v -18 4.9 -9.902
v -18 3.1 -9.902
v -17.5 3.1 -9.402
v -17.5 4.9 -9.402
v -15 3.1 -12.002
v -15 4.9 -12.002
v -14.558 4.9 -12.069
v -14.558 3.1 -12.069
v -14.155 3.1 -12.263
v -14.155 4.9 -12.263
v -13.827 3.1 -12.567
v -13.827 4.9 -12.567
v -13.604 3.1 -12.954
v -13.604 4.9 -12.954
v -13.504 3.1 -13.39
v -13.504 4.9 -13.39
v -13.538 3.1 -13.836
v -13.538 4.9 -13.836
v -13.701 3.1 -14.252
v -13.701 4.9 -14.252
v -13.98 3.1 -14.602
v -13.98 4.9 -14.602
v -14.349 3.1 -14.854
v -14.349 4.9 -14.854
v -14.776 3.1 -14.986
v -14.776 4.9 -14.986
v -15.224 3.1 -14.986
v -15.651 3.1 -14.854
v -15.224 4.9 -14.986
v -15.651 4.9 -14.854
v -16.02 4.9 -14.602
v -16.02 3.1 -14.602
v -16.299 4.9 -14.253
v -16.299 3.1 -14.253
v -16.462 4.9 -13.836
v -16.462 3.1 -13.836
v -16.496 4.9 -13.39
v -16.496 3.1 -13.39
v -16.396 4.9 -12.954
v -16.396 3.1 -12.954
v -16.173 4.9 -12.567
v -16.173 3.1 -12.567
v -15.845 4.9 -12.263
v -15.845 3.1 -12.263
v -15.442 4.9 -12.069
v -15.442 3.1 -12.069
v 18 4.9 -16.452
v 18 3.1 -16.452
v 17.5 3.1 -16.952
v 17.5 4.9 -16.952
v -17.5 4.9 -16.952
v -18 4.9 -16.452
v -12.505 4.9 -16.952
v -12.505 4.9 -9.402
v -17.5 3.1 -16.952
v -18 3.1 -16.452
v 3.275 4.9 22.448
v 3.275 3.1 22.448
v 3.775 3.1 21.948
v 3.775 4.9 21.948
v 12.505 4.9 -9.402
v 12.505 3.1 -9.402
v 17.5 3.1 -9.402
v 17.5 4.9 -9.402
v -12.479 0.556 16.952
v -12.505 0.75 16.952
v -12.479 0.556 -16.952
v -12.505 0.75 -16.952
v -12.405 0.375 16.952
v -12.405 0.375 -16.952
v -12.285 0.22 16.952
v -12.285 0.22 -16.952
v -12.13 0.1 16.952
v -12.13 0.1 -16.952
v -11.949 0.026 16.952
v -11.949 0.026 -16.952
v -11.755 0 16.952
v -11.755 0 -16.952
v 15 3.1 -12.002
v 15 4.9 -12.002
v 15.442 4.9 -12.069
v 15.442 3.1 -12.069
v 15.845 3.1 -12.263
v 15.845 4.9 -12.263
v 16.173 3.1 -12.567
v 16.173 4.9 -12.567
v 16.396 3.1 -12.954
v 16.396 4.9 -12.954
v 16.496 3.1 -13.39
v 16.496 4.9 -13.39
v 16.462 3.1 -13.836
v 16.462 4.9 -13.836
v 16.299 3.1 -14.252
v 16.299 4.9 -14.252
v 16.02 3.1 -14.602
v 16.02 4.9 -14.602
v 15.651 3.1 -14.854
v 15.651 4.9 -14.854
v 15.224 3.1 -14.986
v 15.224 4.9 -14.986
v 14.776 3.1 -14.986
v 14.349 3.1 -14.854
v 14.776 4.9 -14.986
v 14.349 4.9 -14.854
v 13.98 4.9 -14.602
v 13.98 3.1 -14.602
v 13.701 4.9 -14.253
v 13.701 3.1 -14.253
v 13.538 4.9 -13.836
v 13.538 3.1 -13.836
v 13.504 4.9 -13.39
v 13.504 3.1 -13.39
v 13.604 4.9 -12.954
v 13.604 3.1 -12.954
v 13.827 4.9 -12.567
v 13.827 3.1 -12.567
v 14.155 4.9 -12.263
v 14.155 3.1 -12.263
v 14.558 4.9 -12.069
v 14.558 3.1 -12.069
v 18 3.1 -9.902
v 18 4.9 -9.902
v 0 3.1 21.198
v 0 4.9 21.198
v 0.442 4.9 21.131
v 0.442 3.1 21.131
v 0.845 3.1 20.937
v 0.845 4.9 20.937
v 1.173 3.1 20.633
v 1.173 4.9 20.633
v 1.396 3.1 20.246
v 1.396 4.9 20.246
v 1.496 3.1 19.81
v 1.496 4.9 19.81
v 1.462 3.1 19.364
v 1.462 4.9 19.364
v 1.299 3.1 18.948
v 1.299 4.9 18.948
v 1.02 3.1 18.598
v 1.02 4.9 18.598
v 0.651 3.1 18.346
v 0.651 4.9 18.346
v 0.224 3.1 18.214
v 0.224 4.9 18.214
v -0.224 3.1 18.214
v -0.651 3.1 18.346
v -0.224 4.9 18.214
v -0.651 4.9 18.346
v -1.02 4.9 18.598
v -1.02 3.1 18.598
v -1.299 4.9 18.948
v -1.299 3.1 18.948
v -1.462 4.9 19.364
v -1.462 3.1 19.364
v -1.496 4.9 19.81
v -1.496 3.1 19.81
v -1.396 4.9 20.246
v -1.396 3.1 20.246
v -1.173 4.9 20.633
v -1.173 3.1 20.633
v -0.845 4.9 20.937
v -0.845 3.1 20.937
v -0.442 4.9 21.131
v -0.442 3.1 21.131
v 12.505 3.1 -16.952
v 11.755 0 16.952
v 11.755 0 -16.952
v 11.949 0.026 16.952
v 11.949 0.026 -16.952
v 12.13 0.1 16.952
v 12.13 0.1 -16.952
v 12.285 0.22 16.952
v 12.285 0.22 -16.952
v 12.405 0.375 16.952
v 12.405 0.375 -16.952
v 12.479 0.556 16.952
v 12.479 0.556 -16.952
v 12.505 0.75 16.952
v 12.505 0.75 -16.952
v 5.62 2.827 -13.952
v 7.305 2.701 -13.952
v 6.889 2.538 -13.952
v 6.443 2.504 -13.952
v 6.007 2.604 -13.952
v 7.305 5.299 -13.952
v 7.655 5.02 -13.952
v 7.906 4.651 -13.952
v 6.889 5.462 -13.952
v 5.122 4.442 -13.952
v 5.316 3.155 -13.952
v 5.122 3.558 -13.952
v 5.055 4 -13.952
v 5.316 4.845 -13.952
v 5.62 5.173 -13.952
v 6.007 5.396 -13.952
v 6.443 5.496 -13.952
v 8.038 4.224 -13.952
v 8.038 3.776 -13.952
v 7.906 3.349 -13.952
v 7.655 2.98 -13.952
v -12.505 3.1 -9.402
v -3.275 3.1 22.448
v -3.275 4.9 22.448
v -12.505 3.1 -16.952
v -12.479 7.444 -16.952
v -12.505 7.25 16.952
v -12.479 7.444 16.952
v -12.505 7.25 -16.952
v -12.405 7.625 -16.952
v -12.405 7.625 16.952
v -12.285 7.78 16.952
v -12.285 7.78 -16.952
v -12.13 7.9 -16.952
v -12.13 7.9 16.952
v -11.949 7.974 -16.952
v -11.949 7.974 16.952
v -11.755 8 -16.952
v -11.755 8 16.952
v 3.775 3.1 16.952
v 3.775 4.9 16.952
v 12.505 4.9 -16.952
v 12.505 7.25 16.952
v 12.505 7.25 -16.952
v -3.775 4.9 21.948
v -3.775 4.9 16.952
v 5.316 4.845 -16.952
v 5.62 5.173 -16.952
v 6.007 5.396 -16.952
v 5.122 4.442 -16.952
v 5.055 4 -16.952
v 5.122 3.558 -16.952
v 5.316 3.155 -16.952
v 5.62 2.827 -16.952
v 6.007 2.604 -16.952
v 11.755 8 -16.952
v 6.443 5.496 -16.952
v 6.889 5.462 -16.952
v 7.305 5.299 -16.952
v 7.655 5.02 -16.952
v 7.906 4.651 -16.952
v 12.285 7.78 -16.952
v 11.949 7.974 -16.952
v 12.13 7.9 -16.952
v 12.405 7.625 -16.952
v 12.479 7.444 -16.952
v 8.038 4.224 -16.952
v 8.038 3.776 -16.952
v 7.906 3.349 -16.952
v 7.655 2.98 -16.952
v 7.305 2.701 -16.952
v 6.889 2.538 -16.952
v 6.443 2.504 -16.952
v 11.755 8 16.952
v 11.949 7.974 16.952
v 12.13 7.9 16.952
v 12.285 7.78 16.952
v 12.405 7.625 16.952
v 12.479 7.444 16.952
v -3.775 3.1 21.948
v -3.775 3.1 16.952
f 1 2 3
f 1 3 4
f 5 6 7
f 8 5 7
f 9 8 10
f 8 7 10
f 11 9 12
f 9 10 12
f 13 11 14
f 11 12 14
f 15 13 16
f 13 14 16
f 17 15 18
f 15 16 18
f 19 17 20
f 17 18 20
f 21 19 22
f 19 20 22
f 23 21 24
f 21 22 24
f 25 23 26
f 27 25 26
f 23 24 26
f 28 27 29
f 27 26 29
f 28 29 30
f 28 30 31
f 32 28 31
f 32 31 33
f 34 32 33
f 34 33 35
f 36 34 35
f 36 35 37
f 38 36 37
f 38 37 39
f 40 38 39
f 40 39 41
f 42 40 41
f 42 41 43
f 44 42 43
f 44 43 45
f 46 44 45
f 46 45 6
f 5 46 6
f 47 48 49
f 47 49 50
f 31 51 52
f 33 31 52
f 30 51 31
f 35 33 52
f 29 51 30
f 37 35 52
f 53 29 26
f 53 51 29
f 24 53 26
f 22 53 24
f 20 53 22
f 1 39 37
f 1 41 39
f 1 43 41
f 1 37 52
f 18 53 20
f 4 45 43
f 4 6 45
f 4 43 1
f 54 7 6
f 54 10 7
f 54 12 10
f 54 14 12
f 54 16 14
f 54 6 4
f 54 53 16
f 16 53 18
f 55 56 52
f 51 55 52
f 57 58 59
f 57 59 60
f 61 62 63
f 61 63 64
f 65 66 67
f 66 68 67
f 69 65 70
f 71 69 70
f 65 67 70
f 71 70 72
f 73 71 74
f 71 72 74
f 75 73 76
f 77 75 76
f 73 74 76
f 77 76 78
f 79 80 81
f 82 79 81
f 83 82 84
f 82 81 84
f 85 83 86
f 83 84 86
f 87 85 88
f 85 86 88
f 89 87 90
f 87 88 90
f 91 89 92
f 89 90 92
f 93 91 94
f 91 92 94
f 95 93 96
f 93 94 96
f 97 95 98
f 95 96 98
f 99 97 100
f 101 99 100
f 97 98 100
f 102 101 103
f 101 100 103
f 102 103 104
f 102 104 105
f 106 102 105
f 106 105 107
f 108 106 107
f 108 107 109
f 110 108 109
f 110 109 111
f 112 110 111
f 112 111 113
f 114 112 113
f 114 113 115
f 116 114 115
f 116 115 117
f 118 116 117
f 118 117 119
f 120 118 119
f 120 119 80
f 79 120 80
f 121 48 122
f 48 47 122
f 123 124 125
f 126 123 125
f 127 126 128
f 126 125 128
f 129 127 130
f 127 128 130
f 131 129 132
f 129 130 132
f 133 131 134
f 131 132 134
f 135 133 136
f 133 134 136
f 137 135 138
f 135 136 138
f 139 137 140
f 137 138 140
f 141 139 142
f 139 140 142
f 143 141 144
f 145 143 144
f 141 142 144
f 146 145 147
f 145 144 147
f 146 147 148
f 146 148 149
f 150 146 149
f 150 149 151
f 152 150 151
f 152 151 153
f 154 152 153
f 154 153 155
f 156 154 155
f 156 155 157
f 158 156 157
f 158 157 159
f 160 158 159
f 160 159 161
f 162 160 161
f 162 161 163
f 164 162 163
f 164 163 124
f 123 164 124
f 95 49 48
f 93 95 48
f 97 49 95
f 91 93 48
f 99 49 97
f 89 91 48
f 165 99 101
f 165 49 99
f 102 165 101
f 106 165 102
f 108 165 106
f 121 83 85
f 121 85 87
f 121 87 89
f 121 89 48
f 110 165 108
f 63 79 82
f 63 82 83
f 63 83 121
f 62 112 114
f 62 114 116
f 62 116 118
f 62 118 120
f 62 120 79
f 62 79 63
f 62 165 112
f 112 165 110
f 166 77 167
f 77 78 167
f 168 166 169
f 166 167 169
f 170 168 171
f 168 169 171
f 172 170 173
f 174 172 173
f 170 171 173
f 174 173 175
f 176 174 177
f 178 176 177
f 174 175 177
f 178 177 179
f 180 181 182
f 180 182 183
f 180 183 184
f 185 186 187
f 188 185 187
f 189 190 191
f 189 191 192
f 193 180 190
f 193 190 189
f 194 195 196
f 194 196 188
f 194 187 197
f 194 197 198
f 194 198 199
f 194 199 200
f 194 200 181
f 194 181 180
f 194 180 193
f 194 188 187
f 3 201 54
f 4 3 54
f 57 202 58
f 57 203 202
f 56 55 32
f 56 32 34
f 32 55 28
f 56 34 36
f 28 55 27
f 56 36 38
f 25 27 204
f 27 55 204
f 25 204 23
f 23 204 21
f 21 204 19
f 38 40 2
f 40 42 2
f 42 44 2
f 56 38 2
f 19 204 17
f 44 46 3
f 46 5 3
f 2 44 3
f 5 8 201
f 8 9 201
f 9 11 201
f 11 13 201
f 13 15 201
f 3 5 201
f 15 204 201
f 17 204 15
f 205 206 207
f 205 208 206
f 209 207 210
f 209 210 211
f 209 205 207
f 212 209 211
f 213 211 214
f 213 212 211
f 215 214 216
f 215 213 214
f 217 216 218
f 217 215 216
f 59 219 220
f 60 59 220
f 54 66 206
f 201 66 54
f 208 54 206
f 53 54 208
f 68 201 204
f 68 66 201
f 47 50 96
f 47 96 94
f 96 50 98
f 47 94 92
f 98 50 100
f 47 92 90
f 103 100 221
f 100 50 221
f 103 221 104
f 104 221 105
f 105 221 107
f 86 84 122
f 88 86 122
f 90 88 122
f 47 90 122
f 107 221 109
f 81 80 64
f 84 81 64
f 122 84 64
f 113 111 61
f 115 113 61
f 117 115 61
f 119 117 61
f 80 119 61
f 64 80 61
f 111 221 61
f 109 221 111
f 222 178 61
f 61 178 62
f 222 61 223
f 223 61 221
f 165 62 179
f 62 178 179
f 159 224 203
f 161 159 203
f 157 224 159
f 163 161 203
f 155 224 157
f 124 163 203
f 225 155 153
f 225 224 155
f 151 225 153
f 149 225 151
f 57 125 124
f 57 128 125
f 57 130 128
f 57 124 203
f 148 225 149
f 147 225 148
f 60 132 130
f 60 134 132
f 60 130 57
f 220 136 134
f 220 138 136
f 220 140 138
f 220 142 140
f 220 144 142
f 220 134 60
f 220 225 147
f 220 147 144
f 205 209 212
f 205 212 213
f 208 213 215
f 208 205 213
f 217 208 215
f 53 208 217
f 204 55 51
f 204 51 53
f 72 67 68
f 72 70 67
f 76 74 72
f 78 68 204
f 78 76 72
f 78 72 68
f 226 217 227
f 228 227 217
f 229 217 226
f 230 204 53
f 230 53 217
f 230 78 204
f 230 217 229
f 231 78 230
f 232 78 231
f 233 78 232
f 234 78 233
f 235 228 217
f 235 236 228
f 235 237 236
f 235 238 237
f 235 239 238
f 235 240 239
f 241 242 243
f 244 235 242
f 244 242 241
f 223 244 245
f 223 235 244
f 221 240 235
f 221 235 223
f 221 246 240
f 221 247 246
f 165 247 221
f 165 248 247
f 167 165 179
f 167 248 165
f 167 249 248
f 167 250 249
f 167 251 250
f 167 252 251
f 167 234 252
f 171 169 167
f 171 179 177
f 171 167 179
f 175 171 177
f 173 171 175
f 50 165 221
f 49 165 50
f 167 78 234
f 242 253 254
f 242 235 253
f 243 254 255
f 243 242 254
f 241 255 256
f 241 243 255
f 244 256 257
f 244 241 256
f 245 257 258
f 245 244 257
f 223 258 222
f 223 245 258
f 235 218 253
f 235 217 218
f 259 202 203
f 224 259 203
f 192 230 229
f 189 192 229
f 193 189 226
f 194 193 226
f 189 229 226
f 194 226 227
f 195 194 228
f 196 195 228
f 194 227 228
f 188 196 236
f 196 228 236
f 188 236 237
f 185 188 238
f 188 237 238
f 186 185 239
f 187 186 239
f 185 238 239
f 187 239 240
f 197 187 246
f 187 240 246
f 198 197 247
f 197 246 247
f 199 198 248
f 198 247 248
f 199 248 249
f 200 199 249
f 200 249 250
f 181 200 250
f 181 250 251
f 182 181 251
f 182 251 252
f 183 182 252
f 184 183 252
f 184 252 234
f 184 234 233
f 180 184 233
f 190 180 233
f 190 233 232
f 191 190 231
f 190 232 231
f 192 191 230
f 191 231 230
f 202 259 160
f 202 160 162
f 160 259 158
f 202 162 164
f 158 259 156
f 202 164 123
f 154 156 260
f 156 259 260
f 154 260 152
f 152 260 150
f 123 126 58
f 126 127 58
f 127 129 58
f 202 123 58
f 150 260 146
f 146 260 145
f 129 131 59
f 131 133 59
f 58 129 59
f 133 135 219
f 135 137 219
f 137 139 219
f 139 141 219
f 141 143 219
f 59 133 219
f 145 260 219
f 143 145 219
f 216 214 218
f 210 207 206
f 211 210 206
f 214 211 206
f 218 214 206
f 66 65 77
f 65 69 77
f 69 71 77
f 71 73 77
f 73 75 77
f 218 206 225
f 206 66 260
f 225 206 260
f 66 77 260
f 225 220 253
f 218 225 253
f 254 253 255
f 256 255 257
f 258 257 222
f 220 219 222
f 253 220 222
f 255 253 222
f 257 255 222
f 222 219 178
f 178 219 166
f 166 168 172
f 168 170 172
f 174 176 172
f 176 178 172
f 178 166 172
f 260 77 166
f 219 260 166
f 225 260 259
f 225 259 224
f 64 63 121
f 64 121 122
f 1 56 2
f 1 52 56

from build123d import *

# Parameters (mm, degrees)
SKETCH1_W           = 25.01
SKETCH1_H           = 33.905
BOSS_EXTRUDE1_DEPTH = 8
SKETCH2_W           = 7.55
SKETCH2_H           = 1.8
BOSS_EXTRUDE2_DEPTH = 5.495
SKETCH3_W           = 7.55
SKETCH3_H           = 1.8
BOSS_EXTRUDE3_DEPTH = 5.495
SKETCH6_R           = 1.5
CUT_EXTRUDE1_DEPTH  = 2
SKETCH8_R           = 1.5
CUT_EXTRUDE2_DEPTH  = 3
FILLET1_R           = 0.75
CHAMFER1_SIZE       = 0.5


with BuildPart() as part:
    # Sketch1 → Boss-Extrude1 (new body)
    with BuildSketch(Plane(origin=(0, 0, 0), x_dir=(1, 0, 0), z_dir=(0, 1, 0))):
        Rectangle(SKETCH1_W, SKETCH1_H)
    extrude(amount=BOSS_EXTRUDE1_DEPTH)

    # Sketch2 → Boss-Extrude2 (add)
    with BuildSketch(Plane.XY.offset(16.9525)):
        with Locations((0, 4)):
            Rectangle(SKETCH2_W, SKETCH2_H)
    extrude(amount=BOSS_EXTRUDE2_DEPTH)

    # Sketch3 → Boss-Extrude3 (add)
    with BuildSketch(Plane.ZY.offset(12.505)):
        with Locations((-13.1775, 4)):
            Rectangle(SKETCH3_W, SKETCH3_H)
    boss_extrude3 = extrude(amount=BOSS_EXTRUDE3_DEPTH)

    # Mirror2: Boss-Extrude3 across plane
    add(boss_extrude3.mirror(Plane(origin=(0, 0, 0), x_dir=(0, 0, 1), z_dir=(1, 0, 0))))

    # Sketch6 → Cut-Extrude1 (cut)
    with BuildSketch(Plane(origin=(0, 4.9, 0), x_dir=(1, 0, 0), z_dir=(0, 1, 0))):
        with Locations(Location((-15, 13.5025, 0), (0, 0, 270))):
            Circle(SKETCH6_R)
        with Locations(Location((15, 13.5025, 0), (0, 0, 270))):
            Circle(SKETCH6_R)
        with Locations(Location((0, -19.6975, 0), (0, 0, 270))):
            Circle(SKETCH6_R)
    extrude(amount=-CUT_EXTRUDE1_DEPTH, mode=Mode.SUBTRACT)

    # Sketch8 → Cut-Extrude2 (cut)
    with BuildSketch(Plane(origin=(0, 0, -16.9525), x_dir=(-1, 0, 0), z_dir=(0, 0, -1))):
        with Locations((-6.555, 4)):
            Circle(SKETCH8_R)
    extrude(amount=-CUT_EXTRUDE2_DEPTH, mode=Mode.SUBTRACT)

    # Fillet1
    fillet1_edges = [part.edges().sort_by_distance(p)[0] for p in [
        (-12.505, 8, 0),
        (12.505, 8, 0),
        (-12.505, 0, 0),
        (12.505, 0, 0),
    ]]
    fillet(fillet1_edges, radius=FILLET1_R)

    # Chamfer1
    chamfer1_edges = [part.edges().sort_by_distance(p)[0] for p in [
        (3.775, 4, 22.4475),
        (-3.775, 4, 22.4475),
        (-18, 4, -16.9525),
        (-18, 4, -9.4025),
        (18, 4, -16.9525),
        (18, 4, -9.4025),
    ]]
    chamfer(chamfer1_edges, length=CHAMFER1_SIZE)


solid = part.part
